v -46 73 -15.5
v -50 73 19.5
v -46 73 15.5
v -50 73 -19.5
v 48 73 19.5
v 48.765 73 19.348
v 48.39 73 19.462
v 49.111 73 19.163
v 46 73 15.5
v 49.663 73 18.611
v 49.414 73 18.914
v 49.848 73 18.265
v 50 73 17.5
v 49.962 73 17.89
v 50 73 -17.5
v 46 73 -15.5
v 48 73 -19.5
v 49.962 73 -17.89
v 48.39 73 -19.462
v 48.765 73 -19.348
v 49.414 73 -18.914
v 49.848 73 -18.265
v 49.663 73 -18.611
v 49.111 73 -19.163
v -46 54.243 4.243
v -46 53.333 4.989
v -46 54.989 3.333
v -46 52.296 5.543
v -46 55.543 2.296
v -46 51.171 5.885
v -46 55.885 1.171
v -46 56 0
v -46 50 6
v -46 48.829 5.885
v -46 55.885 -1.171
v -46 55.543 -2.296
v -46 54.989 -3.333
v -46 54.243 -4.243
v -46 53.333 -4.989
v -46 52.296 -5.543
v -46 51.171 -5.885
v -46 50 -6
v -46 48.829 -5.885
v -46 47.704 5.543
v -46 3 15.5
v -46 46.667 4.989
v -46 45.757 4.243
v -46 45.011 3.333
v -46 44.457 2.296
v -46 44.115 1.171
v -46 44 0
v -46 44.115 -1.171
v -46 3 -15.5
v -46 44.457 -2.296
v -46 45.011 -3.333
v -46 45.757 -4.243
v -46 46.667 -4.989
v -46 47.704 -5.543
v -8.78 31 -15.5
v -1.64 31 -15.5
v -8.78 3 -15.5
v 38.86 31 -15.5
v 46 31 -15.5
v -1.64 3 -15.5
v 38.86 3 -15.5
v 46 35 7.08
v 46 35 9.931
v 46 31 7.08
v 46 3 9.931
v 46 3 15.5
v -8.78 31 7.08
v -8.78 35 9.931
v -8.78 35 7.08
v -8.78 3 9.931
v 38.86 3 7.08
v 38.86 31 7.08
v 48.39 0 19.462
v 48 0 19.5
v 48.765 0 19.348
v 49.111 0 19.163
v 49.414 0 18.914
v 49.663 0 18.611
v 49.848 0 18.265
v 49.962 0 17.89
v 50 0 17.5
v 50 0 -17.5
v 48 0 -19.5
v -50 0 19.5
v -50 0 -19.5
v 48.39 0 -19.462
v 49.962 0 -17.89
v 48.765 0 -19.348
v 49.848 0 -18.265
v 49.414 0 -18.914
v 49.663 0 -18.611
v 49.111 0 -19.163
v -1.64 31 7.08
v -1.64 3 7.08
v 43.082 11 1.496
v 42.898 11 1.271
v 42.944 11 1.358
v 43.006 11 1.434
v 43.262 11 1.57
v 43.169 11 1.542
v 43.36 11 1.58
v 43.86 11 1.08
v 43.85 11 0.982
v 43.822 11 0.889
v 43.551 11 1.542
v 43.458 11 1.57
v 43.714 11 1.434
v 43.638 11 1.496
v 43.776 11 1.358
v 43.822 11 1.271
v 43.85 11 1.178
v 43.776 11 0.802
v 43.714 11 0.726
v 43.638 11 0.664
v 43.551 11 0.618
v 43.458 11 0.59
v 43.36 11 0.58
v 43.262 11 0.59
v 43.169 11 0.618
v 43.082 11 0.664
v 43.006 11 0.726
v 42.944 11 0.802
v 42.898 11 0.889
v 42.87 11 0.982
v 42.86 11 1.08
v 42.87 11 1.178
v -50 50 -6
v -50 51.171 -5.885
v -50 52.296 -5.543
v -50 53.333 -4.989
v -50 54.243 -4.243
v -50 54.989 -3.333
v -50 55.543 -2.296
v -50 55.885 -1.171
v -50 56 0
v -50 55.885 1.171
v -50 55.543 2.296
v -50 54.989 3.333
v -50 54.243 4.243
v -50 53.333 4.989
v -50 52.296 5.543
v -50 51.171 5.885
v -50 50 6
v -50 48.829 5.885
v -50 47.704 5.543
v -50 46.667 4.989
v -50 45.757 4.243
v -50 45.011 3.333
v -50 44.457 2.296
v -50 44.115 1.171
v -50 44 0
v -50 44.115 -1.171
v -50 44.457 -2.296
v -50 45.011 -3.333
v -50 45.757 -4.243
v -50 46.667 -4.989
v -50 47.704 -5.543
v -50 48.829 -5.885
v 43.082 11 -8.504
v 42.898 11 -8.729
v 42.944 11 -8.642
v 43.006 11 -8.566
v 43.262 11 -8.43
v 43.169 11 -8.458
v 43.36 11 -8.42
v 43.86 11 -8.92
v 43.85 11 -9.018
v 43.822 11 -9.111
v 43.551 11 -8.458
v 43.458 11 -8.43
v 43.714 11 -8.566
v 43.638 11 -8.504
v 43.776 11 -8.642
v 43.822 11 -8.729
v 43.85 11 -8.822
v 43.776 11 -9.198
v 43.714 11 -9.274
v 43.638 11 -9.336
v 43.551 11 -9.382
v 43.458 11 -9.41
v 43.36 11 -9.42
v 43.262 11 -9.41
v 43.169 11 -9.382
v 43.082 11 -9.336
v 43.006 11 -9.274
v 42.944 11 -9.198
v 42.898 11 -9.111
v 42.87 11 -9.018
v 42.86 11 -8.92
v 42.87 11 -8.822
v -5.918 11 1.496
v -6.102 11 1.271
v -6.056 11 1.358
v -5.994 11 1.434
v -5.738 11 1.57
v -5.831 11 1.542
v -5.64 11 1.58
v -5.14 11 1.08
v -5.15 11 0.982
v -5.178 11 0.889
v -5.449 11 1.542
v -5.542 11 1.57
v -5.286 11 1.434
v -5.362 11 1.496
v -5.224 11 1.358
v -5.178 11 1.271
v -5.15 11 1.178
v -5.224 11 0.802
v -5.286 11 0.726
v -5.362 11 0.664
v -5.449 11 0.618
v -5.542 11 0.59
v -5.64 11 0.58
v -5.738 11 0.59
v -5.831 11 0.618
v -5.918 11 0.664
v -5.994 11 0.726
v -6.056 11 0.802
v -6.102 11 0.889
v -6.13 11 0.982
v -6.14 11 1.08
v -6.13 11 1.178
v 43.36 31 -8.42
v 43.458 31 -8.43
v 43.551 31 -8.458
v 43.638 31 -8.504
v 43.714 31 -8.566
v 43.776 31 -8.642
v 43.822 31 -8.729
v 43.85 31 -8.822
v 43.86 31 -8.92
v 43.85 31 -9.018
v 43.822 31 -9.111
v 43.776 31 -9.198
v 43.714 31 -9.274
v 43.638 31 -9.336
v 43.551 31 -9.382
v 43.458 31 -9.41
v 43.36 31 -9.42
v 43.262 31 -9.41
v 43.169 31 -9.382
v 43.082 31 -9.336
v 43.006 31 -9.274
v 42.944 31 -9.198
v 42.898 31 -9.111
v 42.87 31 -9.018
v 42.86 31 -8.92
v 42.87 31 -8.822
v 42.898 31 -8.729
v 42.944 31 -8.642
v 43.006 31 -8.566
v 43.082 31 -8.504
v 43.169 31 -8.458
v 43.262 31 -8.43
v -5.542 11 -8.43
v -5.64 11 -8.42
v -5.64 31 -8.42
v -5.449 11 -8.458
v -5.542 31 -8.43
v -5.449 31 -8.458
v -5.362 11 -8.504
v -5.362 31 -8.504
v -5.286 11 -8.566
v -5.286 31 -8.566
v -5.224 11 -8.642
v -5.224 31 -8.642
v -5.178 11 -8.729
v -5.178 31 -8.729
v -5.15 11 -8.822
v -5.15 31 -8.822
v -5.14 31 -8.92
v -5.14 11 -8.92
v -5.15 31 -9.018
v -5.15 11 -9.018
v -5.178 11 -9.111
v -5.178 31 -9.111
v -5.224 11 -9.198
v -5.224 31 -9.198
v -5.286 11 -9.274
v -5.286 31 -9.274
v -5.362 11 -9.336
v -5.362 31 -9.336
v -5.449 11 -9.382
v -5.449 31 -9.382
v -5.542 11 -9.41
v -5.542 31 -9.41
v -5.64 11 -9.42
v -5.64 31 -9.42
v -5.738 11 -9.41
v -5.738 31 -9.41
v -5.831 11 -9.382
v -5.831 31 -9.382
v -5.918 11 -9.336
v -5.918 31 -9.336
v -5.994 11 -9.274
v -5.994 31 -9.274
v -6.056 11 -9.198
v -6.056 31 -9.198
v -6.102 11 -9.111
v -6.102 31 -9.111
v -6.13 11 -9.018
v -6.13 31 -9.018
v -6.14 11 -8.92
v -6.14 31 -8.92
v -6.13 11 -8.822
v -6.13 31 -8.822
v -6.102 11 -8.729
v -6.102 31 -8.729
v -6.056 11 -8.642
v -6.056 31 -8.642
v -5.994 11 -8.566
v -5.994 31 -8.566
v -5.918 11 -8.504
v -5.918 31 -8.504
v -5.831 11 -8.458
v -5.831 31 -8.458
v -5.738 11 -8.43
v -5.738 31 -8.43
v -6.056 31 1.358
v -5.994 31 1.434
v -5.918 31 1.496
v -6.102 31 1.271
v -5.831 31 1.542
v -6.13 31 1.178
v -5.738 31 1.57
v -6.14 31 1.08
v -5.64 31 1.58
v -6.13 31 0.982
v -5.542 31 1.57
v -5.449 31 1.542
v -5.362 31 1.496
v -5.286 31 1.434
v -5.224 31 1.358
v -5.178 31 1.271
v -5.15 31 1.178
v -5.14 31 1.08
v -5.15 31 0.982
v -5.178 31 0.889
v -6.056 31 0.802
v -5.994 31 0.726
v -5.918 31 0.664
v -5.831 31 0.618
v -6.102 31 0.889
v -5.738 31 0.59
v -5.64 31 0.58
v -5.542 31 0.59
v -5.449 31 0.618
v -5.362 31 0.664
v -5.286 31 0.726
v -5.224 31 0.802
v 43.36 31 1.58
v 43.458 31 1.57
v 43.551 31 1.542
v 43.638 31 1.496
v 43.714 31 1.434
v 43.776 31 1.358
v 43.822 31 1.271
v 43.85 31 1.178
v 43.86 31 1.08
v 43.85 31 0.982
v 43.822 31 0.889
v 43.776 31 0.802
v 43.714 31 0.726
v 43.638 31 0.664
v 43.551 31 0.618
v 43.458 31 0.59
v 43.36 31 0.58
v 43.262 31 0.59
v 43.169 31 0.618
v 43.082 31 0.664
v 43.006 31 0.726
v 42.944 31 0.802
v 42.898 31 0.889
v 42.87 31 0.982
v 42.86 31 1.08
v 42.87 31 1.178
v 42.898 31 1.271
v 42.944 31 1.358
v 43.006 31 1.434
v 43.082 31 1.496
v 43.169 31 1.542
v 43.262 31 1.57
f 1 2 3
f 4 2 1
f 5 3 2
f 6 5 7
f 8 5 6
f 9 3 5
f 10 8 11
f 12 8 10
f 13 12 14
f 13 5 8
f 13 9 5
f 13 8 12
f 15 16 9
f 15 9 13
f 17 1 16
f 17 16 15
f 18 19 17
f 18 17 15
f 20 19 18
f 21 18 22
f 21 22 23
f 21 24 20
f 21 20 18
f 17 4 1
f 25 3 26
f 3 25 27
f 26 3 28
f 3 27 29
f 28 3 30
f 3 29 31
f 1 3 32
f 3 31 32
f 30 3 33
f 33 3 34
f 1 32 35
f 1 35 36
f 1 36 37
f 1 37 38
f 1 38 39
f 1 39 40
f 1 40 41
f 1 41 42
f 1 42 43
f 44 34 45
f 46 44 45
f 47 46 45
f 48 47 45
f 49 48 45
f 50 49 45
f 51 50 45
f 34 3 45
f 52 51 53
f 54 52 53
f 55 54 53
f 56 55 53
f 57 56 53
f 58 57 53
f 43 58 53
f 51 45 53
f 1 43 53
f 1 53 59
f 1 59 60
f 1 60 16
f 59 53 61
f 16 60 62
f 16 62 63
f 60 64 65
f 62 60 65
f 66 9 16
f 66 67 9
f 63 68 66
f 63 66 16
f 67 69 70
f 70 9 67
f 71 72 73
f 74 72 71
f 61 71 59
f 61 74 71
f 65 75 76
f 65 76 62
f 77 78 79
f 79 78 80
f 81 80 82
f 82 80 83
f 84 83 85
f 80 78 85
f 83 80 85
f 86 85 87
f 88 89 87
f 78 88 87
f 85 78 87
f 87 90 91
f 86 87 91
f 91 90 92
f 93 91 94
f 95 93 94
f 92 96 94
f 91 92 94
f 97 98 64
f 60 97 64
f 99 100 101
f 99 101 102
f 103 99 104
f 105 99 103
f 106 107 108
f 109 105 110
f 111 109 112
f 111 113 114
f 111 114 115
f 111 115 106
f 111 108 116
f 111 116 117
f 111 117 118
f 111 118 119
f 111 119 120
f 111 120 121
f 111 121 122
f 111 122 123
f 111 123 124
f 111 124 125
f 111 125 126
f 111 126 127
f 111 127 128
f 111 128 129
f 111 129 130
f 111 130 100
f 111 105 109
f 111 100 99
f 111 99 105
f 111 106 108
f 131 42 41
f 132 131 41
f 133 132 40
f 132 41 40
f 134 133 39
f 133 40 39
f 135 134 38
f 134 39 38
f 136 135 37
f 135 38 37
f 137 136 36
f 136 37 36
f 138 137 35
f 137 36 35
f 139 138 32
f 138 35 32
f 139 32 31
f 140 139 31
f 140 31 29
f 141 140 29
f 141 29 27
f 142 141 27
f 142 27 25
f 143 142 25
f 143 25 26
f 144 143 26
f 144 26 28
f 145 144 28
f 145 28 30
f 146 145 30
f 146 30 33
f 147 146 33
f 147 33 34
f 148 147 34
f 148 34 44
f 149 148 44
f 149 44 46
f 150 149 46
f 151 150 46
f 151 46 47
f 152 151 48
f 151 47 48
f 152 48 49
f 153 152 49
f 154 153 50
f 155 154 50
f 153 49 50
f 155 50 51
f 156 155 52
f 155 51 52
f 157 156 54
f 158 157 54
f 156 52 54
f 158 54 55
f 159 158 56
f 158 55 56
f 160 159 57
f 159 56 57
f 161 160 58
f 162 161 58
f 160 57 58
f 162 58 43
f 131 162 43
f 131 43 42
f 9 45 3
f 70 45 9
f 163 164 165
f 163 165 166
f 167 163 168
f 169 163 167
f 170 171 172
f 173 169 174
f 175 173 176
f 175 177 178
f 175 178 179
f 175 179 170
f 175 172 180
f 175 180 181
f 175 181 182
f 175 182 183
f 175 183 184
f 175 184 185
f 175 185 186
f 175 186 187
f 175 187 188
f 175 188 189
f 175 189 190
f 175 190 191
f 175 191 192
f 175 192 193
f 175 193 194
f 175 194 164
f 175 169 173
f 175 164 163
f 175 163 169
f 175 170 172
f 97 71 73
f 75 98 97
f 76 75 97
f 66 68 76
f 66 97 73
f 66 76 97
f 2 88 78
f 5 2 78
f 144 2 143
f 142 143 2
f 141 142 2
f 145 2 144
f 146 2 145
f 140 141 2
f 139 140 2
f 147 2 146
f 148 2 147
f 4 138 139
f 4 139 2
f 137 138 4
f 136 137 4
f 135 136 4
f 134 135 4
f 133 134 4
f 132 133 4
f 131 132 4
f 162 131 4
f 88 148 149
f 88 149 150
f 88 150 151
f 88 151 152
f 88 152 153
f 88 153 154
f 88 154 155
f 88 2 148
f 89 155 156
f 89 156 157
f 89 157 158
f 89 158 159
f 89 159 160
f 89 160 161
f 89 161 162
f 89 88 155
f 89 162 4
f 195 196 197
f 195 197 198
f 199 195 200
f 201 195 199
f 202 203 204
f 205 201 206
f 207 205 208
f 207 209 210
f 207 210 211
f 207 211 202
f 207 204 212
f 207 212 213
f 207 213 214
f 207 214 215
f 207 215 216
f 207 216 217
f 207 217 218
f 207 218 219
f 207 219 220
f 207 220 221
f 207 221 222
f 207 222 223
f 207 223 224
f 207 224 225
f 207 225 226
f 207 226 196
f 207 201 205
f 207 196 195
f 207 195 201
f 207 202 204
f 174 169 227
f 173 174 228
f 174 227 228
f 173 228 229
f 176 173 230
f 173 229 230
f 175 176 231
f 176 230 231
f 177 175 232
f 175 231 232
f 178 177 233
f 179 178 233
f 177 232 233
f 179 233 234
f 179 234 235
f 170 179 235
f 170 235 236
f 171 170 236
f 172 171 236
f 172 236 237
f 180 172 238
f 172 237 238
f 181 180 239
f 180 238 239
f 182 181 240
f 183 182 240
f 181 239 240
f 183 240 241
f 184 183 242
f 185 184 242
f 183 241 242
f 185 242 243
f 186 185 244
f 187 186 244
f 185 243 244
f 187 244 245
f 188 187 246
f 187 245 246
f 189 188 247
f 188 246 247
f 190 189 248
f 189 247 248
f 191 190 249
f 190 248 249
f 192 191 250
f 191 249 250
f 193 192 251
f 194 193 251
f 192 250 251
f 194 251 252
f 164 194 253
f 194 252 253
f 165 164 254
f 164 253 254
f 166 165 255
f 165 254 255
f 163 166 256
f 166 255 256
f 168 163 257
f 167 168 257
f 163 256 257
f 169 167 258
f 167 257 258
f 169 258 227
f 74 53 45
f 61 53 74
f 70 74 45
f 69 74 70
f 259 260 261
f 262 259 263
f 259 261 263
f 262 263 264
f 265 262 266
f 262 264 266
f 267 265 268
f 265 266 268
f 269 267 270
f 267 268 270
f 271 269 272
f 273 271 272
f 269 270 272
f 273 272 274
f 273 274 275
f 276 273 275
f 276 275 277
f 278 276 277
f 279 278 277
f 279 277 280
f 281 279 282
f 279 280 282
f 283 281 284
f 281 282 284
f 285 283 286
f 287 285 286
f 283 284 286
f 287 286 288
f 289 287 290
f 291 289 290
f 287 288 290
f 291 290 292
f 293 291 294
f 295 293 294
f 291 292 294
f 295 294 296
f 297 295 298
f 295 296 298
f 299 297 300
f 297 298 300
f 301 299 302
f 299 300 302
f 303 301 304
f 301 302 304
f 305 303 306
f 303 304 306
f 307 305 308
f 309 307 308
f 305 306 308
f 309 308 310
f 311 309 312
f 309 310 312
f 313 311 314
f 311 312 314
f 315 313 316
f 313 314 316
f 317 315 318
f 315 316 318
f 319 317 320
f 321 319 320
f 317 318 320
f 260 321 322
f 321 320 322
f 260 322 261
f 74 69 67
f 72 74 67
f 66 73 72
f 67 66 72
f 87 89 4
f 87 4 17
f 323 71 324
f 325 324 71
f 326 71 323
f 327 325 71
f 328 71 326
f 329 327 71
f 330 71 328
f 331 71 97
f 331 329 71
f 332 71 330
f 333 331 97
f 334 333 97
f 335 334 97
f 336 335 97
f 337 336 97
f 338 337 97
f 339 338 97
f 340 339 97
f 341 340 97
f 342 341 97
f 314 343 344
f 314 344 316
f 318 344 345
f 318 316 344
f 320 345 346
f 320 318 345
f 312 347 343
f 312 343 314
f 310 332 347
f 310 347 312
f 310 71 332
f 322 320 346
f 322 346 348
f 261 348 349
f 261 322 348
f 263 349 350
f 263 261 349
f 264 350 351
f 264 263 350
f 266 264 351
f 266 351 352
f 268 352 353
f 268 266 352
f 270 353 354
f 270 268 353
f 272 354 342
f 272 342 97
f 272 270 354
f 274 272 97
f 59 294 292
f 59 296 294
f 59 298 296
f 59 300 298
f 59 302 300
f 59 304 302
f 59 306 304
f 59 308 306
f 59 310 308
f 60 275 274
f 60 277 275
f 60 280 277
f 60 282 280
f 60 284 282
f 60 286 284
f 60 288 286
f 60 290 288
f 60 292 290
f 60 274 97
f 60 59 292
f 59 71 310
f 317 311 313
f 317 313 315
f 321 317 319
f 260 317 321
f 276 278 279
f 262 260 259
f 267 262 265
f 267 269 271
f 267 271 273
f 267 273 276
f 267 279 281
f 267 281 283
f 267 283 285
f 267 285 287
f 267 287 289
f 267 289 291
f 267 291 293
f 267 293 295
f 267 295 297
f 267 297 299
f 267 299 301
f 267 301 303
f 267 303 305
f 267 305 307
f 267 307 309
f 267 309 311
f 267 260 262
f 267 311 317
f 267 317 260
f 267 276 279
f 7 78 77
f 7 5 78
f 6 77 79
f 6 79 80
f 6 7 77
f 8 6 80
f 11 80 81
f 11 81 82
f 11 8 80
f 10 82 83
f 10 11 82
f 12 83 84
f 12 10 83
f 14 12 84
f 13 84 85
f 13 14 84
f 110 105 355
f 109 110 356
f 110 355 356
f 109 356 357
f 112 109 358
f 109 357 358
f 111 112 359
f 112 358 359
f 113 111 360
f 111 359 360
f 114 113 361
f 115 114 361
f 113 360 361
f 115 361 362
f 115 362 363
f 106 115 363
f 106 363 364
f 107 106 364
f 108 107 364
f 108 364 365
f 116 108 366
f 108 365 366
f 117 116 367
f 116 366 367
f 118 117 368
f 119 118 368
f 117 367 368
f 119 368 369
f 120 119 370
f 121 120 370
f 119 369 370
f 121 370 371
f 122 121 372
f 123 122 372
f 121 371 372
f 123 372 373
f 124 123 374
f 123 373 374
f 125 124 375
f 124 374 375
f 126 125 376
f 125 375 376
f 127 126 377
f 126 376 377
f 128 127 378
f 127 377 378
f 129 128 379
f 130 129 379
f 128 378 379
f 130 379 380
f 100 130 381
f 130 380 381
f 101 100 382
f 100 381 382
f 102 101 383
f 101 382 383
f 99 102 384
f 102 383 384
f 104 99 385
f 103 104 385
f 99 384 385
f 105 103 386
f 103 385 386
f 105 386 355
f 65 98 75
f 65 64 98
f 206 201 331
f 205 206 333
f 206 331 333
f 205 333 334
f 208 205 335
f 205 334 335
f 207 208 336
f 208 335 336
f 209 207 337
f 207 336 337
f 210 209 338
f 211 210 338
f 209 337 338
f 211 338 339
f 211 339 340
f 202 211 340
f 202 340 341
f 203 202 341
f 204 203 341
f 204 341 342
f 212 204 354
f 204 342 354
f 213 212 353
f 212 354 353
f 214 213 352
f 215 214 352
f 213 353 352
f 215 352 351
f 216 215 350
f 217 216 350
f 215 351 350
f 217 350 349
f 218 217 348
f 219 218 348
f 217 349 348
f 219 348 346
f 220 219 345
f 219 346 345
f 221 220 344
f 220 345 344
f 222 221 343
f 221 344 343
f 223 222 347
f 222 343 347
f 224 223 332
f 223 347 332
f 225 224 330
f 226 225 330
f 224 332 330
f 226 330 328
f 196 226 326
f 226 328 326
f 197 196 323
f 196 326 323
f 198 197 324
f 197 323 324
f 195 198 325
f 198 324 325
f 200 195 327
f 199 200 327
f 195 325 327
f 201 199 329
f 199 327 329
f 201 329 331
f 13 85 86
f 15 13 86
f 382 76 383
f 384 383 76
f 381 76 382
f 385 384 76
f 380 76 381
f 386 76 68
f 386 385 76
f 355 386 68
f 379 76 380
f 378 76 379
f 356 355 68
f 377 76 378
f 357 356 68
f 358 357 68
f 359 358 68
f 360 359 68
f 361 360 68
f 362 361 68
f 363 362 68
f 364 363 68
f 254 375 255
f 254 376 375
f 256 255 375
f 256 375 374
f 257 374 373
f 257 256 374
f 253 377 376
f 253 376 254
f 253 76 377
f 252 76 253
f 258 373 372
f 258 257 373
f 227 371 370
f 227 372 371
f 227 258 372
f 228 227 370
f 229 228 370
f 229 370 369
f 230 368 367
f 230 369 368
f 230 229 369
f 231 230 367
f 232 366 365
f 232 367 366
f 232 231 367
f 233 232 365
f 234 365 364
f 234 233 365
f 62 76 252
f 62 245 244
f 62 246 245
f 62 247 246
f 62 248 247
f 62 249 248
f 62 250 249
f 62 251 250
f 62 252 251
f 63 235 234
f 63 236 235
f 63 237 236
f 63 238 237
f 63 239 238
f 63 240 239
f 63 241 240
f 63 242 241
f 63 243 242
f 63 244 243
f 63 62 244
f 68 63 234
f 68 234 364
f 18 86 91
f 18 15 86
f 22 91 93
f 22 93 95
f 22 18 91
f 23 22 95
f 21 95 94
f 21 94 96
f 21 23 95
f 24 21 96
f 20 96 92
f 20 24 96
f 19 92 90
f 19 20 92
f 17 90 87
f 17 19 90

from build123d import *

# Parameters (mm, degrees)
SKETCH1_W           = 92
SKETCH1_H           = 31
BOSS_EXTRUDE2_DEPTH = 3
SKETCH1_3_W         = 100
SKETCH1_3_H         = 39
SKETCH1_3_W_2       = 92
SKETCH1_3_H_2       = 31
BOSS_EXTRUDE3_DEPTH = 73
FILLET1_R           = 2
FILLET2_R           = 2
SKETCH3_W           = 7.14
SKETCH3_H           = 31
BOSS_EXTRUDE4_DEPTH = 28
SKETCH4_W           = 7.14
SKETCH4_H           = 2.85103565
BOSS_EXTRUDE5_DEPTH = 4
SKETCH5_W           = 7.14
SKETCH5_H           = 5.56896435
CUT_EXTRUDE1_DEPTH  = 28
SKETCH4_3_R         = 0.5
CUT_EXTRUDE3_DEPTH  = 20
LPATTERN5_COUNT     = 2
LPATTERN5_PITCH     = 47.64
LPATTERN6_COUNT     = 2
LPATTERN6_PITCH     = 49
SKETCH10_W          = 2.85103565
SKETCH10_H          = 32
BOSS_EXTRUDE6_DEPTH = 41
SKETCH12_R          = 6
CUT_EXTRUDE4_DEPTH  = 10


with BuildPart() as part:
    # Sketch1 → Boss-Extrude2 (new body)
    with BuildSketch(Plane(origin=(0, 0, 0), x_dir=(1, 0, 0), z_dir=(0, 1, 0))):
        Rectangle(SKETCH1_W, SKETCH1_H)
    extrude(amount=BOSS_EXTRUDE2_DEPTH)

    # Sketch1<3> → Boss-Extrude3 (add)
    with BuildSketch(Plane(origin=(0, 0, 0), x_dir=(1, 0, 0), z_dir=(0, 1, 0))):
        Rectangle(SKETCH1_3_W, SKETCH1_3_H)
        Rectangle(SKETCH1_3_W_2, SKETCH1_3_H_2, mode=Mode.SUBTRACT)
    extrude(amount=BOSS_EXTRUDE3_DEPTH)

    # Fillet1
    fillet1_edges = [part.edges().sort_by_distance(p)[0] for p in [
        (50, 36.5, 19.5),
    ]]
    fillet(fillet1_edges, radius=FILLET1_R)

    # Fillet2
    fillet2_edges = [part.edges().sort_by_distance(p)[0] for p in [
        (50, 36.5, -19.5),
    ]]
    fillet(fillet2_edges, radius=FILLET2_R)

    # Sketch3 → Boss-Extrude4 (add)
    with BuildSketch(Plane(origin=(0, 3, 0), x_dir=(1, 0, 0), z_dir=(0, 1, 0))):
        with Locations((42.43, 0)):
            Rectangle(SKETCH3_W, SKETCH3_H)
    boss_extrude4 = extrude(amount=BOSS_EXTRUDE4_DEPTH)

    # Sketch4 → Boss-Extrude5 (add)
    with BuildSketch(Plane(origin=(0, 31, 0), x_dir=(1, 0, 0), z_dir=(0, 1, 0))):
        with Locations((42.43, -8.505517825)):
            Rectangle(SKETCH4_W, SKETCH4_H)
    boss_extrude5 = extrude(amount=BOSS_EXTRUDE5_DEPTH)

    # Sketch5 → Cut-Extrude1 (cut)
    with BuildSketch(Plane(origin=(0, 31, 0), x_dir=(1, 0, 0), z_dir=(0, 1, 0))):
        with Locations((42.43, -12.715517825)):
            Rectangle(SKETCH5_W, SKETCH5_H)
    cut_extrude1 = extrude(amount=-CUT_EXTRUDE1_DEPTH, mode=Mode.SUBTRACT)

    # Sketch4<3> → Cut-Extrude3 (cut)
    with BuildSketch(Plane(origin=(0, 31, 0), x_dir=(1, 0, 0), z_dir=(0, 1, 0))):
        with Locations((43.36, 8.92)):
            Circle(SKETCH4_3_R)
        with Locations((43.36, -1.08)):
            Circle(SKETCH4_3_R)
    cut_extrude3 = extrude(amount=-CUT_EXTRUDE3_DEPTH, mode=Mode.SUBTRACT)

    # LPattern5: Boss-Extrude4, Boss-Extrude5, Cut-Extrude1 ×2
    with Locations(*[(-i * LPATTERN5_PITCH, 0, 0) for i in range(1, LPATTERN5_COUNT)]):
        add(boss_extrude4)
        add(boss_extrude5)
        add(cut_extrude1, mode=Mode.SUBTRACT)

    # LPattern6: Cut-Extrude3 ×2
    with Locations(*[(-i * LPATTERN6_PITCH, 0, 0) for i in range(1, LPATTERN6_COUNT)]):
        add(cut_extrude3, mode=Mode.SUBTRACT)

    # Sketch10 → Boss-Extrude6 (add)
    with BuildSketch(Plane.ZY.offset(-38.86)):
        with Locations((8.505517825, 19)):
            Rectangle(SKETCH10_W, SKETCH10_H)
    extrude(amount=BOSS_EXTRUDE6_DEPTH)

    # Sketch12 → Cut-Extrude4 (cut)
    with BuildSketch(Plane(origin=(-46, 0, 0), x_dir=(0, 0, -1), z_dir=(1, 0, 0))):
        with Locations((0, 50)):
            Circle(SKETCH12_R)
    extrude(amount=-CUT_EXTRUDE4_DEPTH, mode=Mode.SUBTRACT)


solid = part.part
